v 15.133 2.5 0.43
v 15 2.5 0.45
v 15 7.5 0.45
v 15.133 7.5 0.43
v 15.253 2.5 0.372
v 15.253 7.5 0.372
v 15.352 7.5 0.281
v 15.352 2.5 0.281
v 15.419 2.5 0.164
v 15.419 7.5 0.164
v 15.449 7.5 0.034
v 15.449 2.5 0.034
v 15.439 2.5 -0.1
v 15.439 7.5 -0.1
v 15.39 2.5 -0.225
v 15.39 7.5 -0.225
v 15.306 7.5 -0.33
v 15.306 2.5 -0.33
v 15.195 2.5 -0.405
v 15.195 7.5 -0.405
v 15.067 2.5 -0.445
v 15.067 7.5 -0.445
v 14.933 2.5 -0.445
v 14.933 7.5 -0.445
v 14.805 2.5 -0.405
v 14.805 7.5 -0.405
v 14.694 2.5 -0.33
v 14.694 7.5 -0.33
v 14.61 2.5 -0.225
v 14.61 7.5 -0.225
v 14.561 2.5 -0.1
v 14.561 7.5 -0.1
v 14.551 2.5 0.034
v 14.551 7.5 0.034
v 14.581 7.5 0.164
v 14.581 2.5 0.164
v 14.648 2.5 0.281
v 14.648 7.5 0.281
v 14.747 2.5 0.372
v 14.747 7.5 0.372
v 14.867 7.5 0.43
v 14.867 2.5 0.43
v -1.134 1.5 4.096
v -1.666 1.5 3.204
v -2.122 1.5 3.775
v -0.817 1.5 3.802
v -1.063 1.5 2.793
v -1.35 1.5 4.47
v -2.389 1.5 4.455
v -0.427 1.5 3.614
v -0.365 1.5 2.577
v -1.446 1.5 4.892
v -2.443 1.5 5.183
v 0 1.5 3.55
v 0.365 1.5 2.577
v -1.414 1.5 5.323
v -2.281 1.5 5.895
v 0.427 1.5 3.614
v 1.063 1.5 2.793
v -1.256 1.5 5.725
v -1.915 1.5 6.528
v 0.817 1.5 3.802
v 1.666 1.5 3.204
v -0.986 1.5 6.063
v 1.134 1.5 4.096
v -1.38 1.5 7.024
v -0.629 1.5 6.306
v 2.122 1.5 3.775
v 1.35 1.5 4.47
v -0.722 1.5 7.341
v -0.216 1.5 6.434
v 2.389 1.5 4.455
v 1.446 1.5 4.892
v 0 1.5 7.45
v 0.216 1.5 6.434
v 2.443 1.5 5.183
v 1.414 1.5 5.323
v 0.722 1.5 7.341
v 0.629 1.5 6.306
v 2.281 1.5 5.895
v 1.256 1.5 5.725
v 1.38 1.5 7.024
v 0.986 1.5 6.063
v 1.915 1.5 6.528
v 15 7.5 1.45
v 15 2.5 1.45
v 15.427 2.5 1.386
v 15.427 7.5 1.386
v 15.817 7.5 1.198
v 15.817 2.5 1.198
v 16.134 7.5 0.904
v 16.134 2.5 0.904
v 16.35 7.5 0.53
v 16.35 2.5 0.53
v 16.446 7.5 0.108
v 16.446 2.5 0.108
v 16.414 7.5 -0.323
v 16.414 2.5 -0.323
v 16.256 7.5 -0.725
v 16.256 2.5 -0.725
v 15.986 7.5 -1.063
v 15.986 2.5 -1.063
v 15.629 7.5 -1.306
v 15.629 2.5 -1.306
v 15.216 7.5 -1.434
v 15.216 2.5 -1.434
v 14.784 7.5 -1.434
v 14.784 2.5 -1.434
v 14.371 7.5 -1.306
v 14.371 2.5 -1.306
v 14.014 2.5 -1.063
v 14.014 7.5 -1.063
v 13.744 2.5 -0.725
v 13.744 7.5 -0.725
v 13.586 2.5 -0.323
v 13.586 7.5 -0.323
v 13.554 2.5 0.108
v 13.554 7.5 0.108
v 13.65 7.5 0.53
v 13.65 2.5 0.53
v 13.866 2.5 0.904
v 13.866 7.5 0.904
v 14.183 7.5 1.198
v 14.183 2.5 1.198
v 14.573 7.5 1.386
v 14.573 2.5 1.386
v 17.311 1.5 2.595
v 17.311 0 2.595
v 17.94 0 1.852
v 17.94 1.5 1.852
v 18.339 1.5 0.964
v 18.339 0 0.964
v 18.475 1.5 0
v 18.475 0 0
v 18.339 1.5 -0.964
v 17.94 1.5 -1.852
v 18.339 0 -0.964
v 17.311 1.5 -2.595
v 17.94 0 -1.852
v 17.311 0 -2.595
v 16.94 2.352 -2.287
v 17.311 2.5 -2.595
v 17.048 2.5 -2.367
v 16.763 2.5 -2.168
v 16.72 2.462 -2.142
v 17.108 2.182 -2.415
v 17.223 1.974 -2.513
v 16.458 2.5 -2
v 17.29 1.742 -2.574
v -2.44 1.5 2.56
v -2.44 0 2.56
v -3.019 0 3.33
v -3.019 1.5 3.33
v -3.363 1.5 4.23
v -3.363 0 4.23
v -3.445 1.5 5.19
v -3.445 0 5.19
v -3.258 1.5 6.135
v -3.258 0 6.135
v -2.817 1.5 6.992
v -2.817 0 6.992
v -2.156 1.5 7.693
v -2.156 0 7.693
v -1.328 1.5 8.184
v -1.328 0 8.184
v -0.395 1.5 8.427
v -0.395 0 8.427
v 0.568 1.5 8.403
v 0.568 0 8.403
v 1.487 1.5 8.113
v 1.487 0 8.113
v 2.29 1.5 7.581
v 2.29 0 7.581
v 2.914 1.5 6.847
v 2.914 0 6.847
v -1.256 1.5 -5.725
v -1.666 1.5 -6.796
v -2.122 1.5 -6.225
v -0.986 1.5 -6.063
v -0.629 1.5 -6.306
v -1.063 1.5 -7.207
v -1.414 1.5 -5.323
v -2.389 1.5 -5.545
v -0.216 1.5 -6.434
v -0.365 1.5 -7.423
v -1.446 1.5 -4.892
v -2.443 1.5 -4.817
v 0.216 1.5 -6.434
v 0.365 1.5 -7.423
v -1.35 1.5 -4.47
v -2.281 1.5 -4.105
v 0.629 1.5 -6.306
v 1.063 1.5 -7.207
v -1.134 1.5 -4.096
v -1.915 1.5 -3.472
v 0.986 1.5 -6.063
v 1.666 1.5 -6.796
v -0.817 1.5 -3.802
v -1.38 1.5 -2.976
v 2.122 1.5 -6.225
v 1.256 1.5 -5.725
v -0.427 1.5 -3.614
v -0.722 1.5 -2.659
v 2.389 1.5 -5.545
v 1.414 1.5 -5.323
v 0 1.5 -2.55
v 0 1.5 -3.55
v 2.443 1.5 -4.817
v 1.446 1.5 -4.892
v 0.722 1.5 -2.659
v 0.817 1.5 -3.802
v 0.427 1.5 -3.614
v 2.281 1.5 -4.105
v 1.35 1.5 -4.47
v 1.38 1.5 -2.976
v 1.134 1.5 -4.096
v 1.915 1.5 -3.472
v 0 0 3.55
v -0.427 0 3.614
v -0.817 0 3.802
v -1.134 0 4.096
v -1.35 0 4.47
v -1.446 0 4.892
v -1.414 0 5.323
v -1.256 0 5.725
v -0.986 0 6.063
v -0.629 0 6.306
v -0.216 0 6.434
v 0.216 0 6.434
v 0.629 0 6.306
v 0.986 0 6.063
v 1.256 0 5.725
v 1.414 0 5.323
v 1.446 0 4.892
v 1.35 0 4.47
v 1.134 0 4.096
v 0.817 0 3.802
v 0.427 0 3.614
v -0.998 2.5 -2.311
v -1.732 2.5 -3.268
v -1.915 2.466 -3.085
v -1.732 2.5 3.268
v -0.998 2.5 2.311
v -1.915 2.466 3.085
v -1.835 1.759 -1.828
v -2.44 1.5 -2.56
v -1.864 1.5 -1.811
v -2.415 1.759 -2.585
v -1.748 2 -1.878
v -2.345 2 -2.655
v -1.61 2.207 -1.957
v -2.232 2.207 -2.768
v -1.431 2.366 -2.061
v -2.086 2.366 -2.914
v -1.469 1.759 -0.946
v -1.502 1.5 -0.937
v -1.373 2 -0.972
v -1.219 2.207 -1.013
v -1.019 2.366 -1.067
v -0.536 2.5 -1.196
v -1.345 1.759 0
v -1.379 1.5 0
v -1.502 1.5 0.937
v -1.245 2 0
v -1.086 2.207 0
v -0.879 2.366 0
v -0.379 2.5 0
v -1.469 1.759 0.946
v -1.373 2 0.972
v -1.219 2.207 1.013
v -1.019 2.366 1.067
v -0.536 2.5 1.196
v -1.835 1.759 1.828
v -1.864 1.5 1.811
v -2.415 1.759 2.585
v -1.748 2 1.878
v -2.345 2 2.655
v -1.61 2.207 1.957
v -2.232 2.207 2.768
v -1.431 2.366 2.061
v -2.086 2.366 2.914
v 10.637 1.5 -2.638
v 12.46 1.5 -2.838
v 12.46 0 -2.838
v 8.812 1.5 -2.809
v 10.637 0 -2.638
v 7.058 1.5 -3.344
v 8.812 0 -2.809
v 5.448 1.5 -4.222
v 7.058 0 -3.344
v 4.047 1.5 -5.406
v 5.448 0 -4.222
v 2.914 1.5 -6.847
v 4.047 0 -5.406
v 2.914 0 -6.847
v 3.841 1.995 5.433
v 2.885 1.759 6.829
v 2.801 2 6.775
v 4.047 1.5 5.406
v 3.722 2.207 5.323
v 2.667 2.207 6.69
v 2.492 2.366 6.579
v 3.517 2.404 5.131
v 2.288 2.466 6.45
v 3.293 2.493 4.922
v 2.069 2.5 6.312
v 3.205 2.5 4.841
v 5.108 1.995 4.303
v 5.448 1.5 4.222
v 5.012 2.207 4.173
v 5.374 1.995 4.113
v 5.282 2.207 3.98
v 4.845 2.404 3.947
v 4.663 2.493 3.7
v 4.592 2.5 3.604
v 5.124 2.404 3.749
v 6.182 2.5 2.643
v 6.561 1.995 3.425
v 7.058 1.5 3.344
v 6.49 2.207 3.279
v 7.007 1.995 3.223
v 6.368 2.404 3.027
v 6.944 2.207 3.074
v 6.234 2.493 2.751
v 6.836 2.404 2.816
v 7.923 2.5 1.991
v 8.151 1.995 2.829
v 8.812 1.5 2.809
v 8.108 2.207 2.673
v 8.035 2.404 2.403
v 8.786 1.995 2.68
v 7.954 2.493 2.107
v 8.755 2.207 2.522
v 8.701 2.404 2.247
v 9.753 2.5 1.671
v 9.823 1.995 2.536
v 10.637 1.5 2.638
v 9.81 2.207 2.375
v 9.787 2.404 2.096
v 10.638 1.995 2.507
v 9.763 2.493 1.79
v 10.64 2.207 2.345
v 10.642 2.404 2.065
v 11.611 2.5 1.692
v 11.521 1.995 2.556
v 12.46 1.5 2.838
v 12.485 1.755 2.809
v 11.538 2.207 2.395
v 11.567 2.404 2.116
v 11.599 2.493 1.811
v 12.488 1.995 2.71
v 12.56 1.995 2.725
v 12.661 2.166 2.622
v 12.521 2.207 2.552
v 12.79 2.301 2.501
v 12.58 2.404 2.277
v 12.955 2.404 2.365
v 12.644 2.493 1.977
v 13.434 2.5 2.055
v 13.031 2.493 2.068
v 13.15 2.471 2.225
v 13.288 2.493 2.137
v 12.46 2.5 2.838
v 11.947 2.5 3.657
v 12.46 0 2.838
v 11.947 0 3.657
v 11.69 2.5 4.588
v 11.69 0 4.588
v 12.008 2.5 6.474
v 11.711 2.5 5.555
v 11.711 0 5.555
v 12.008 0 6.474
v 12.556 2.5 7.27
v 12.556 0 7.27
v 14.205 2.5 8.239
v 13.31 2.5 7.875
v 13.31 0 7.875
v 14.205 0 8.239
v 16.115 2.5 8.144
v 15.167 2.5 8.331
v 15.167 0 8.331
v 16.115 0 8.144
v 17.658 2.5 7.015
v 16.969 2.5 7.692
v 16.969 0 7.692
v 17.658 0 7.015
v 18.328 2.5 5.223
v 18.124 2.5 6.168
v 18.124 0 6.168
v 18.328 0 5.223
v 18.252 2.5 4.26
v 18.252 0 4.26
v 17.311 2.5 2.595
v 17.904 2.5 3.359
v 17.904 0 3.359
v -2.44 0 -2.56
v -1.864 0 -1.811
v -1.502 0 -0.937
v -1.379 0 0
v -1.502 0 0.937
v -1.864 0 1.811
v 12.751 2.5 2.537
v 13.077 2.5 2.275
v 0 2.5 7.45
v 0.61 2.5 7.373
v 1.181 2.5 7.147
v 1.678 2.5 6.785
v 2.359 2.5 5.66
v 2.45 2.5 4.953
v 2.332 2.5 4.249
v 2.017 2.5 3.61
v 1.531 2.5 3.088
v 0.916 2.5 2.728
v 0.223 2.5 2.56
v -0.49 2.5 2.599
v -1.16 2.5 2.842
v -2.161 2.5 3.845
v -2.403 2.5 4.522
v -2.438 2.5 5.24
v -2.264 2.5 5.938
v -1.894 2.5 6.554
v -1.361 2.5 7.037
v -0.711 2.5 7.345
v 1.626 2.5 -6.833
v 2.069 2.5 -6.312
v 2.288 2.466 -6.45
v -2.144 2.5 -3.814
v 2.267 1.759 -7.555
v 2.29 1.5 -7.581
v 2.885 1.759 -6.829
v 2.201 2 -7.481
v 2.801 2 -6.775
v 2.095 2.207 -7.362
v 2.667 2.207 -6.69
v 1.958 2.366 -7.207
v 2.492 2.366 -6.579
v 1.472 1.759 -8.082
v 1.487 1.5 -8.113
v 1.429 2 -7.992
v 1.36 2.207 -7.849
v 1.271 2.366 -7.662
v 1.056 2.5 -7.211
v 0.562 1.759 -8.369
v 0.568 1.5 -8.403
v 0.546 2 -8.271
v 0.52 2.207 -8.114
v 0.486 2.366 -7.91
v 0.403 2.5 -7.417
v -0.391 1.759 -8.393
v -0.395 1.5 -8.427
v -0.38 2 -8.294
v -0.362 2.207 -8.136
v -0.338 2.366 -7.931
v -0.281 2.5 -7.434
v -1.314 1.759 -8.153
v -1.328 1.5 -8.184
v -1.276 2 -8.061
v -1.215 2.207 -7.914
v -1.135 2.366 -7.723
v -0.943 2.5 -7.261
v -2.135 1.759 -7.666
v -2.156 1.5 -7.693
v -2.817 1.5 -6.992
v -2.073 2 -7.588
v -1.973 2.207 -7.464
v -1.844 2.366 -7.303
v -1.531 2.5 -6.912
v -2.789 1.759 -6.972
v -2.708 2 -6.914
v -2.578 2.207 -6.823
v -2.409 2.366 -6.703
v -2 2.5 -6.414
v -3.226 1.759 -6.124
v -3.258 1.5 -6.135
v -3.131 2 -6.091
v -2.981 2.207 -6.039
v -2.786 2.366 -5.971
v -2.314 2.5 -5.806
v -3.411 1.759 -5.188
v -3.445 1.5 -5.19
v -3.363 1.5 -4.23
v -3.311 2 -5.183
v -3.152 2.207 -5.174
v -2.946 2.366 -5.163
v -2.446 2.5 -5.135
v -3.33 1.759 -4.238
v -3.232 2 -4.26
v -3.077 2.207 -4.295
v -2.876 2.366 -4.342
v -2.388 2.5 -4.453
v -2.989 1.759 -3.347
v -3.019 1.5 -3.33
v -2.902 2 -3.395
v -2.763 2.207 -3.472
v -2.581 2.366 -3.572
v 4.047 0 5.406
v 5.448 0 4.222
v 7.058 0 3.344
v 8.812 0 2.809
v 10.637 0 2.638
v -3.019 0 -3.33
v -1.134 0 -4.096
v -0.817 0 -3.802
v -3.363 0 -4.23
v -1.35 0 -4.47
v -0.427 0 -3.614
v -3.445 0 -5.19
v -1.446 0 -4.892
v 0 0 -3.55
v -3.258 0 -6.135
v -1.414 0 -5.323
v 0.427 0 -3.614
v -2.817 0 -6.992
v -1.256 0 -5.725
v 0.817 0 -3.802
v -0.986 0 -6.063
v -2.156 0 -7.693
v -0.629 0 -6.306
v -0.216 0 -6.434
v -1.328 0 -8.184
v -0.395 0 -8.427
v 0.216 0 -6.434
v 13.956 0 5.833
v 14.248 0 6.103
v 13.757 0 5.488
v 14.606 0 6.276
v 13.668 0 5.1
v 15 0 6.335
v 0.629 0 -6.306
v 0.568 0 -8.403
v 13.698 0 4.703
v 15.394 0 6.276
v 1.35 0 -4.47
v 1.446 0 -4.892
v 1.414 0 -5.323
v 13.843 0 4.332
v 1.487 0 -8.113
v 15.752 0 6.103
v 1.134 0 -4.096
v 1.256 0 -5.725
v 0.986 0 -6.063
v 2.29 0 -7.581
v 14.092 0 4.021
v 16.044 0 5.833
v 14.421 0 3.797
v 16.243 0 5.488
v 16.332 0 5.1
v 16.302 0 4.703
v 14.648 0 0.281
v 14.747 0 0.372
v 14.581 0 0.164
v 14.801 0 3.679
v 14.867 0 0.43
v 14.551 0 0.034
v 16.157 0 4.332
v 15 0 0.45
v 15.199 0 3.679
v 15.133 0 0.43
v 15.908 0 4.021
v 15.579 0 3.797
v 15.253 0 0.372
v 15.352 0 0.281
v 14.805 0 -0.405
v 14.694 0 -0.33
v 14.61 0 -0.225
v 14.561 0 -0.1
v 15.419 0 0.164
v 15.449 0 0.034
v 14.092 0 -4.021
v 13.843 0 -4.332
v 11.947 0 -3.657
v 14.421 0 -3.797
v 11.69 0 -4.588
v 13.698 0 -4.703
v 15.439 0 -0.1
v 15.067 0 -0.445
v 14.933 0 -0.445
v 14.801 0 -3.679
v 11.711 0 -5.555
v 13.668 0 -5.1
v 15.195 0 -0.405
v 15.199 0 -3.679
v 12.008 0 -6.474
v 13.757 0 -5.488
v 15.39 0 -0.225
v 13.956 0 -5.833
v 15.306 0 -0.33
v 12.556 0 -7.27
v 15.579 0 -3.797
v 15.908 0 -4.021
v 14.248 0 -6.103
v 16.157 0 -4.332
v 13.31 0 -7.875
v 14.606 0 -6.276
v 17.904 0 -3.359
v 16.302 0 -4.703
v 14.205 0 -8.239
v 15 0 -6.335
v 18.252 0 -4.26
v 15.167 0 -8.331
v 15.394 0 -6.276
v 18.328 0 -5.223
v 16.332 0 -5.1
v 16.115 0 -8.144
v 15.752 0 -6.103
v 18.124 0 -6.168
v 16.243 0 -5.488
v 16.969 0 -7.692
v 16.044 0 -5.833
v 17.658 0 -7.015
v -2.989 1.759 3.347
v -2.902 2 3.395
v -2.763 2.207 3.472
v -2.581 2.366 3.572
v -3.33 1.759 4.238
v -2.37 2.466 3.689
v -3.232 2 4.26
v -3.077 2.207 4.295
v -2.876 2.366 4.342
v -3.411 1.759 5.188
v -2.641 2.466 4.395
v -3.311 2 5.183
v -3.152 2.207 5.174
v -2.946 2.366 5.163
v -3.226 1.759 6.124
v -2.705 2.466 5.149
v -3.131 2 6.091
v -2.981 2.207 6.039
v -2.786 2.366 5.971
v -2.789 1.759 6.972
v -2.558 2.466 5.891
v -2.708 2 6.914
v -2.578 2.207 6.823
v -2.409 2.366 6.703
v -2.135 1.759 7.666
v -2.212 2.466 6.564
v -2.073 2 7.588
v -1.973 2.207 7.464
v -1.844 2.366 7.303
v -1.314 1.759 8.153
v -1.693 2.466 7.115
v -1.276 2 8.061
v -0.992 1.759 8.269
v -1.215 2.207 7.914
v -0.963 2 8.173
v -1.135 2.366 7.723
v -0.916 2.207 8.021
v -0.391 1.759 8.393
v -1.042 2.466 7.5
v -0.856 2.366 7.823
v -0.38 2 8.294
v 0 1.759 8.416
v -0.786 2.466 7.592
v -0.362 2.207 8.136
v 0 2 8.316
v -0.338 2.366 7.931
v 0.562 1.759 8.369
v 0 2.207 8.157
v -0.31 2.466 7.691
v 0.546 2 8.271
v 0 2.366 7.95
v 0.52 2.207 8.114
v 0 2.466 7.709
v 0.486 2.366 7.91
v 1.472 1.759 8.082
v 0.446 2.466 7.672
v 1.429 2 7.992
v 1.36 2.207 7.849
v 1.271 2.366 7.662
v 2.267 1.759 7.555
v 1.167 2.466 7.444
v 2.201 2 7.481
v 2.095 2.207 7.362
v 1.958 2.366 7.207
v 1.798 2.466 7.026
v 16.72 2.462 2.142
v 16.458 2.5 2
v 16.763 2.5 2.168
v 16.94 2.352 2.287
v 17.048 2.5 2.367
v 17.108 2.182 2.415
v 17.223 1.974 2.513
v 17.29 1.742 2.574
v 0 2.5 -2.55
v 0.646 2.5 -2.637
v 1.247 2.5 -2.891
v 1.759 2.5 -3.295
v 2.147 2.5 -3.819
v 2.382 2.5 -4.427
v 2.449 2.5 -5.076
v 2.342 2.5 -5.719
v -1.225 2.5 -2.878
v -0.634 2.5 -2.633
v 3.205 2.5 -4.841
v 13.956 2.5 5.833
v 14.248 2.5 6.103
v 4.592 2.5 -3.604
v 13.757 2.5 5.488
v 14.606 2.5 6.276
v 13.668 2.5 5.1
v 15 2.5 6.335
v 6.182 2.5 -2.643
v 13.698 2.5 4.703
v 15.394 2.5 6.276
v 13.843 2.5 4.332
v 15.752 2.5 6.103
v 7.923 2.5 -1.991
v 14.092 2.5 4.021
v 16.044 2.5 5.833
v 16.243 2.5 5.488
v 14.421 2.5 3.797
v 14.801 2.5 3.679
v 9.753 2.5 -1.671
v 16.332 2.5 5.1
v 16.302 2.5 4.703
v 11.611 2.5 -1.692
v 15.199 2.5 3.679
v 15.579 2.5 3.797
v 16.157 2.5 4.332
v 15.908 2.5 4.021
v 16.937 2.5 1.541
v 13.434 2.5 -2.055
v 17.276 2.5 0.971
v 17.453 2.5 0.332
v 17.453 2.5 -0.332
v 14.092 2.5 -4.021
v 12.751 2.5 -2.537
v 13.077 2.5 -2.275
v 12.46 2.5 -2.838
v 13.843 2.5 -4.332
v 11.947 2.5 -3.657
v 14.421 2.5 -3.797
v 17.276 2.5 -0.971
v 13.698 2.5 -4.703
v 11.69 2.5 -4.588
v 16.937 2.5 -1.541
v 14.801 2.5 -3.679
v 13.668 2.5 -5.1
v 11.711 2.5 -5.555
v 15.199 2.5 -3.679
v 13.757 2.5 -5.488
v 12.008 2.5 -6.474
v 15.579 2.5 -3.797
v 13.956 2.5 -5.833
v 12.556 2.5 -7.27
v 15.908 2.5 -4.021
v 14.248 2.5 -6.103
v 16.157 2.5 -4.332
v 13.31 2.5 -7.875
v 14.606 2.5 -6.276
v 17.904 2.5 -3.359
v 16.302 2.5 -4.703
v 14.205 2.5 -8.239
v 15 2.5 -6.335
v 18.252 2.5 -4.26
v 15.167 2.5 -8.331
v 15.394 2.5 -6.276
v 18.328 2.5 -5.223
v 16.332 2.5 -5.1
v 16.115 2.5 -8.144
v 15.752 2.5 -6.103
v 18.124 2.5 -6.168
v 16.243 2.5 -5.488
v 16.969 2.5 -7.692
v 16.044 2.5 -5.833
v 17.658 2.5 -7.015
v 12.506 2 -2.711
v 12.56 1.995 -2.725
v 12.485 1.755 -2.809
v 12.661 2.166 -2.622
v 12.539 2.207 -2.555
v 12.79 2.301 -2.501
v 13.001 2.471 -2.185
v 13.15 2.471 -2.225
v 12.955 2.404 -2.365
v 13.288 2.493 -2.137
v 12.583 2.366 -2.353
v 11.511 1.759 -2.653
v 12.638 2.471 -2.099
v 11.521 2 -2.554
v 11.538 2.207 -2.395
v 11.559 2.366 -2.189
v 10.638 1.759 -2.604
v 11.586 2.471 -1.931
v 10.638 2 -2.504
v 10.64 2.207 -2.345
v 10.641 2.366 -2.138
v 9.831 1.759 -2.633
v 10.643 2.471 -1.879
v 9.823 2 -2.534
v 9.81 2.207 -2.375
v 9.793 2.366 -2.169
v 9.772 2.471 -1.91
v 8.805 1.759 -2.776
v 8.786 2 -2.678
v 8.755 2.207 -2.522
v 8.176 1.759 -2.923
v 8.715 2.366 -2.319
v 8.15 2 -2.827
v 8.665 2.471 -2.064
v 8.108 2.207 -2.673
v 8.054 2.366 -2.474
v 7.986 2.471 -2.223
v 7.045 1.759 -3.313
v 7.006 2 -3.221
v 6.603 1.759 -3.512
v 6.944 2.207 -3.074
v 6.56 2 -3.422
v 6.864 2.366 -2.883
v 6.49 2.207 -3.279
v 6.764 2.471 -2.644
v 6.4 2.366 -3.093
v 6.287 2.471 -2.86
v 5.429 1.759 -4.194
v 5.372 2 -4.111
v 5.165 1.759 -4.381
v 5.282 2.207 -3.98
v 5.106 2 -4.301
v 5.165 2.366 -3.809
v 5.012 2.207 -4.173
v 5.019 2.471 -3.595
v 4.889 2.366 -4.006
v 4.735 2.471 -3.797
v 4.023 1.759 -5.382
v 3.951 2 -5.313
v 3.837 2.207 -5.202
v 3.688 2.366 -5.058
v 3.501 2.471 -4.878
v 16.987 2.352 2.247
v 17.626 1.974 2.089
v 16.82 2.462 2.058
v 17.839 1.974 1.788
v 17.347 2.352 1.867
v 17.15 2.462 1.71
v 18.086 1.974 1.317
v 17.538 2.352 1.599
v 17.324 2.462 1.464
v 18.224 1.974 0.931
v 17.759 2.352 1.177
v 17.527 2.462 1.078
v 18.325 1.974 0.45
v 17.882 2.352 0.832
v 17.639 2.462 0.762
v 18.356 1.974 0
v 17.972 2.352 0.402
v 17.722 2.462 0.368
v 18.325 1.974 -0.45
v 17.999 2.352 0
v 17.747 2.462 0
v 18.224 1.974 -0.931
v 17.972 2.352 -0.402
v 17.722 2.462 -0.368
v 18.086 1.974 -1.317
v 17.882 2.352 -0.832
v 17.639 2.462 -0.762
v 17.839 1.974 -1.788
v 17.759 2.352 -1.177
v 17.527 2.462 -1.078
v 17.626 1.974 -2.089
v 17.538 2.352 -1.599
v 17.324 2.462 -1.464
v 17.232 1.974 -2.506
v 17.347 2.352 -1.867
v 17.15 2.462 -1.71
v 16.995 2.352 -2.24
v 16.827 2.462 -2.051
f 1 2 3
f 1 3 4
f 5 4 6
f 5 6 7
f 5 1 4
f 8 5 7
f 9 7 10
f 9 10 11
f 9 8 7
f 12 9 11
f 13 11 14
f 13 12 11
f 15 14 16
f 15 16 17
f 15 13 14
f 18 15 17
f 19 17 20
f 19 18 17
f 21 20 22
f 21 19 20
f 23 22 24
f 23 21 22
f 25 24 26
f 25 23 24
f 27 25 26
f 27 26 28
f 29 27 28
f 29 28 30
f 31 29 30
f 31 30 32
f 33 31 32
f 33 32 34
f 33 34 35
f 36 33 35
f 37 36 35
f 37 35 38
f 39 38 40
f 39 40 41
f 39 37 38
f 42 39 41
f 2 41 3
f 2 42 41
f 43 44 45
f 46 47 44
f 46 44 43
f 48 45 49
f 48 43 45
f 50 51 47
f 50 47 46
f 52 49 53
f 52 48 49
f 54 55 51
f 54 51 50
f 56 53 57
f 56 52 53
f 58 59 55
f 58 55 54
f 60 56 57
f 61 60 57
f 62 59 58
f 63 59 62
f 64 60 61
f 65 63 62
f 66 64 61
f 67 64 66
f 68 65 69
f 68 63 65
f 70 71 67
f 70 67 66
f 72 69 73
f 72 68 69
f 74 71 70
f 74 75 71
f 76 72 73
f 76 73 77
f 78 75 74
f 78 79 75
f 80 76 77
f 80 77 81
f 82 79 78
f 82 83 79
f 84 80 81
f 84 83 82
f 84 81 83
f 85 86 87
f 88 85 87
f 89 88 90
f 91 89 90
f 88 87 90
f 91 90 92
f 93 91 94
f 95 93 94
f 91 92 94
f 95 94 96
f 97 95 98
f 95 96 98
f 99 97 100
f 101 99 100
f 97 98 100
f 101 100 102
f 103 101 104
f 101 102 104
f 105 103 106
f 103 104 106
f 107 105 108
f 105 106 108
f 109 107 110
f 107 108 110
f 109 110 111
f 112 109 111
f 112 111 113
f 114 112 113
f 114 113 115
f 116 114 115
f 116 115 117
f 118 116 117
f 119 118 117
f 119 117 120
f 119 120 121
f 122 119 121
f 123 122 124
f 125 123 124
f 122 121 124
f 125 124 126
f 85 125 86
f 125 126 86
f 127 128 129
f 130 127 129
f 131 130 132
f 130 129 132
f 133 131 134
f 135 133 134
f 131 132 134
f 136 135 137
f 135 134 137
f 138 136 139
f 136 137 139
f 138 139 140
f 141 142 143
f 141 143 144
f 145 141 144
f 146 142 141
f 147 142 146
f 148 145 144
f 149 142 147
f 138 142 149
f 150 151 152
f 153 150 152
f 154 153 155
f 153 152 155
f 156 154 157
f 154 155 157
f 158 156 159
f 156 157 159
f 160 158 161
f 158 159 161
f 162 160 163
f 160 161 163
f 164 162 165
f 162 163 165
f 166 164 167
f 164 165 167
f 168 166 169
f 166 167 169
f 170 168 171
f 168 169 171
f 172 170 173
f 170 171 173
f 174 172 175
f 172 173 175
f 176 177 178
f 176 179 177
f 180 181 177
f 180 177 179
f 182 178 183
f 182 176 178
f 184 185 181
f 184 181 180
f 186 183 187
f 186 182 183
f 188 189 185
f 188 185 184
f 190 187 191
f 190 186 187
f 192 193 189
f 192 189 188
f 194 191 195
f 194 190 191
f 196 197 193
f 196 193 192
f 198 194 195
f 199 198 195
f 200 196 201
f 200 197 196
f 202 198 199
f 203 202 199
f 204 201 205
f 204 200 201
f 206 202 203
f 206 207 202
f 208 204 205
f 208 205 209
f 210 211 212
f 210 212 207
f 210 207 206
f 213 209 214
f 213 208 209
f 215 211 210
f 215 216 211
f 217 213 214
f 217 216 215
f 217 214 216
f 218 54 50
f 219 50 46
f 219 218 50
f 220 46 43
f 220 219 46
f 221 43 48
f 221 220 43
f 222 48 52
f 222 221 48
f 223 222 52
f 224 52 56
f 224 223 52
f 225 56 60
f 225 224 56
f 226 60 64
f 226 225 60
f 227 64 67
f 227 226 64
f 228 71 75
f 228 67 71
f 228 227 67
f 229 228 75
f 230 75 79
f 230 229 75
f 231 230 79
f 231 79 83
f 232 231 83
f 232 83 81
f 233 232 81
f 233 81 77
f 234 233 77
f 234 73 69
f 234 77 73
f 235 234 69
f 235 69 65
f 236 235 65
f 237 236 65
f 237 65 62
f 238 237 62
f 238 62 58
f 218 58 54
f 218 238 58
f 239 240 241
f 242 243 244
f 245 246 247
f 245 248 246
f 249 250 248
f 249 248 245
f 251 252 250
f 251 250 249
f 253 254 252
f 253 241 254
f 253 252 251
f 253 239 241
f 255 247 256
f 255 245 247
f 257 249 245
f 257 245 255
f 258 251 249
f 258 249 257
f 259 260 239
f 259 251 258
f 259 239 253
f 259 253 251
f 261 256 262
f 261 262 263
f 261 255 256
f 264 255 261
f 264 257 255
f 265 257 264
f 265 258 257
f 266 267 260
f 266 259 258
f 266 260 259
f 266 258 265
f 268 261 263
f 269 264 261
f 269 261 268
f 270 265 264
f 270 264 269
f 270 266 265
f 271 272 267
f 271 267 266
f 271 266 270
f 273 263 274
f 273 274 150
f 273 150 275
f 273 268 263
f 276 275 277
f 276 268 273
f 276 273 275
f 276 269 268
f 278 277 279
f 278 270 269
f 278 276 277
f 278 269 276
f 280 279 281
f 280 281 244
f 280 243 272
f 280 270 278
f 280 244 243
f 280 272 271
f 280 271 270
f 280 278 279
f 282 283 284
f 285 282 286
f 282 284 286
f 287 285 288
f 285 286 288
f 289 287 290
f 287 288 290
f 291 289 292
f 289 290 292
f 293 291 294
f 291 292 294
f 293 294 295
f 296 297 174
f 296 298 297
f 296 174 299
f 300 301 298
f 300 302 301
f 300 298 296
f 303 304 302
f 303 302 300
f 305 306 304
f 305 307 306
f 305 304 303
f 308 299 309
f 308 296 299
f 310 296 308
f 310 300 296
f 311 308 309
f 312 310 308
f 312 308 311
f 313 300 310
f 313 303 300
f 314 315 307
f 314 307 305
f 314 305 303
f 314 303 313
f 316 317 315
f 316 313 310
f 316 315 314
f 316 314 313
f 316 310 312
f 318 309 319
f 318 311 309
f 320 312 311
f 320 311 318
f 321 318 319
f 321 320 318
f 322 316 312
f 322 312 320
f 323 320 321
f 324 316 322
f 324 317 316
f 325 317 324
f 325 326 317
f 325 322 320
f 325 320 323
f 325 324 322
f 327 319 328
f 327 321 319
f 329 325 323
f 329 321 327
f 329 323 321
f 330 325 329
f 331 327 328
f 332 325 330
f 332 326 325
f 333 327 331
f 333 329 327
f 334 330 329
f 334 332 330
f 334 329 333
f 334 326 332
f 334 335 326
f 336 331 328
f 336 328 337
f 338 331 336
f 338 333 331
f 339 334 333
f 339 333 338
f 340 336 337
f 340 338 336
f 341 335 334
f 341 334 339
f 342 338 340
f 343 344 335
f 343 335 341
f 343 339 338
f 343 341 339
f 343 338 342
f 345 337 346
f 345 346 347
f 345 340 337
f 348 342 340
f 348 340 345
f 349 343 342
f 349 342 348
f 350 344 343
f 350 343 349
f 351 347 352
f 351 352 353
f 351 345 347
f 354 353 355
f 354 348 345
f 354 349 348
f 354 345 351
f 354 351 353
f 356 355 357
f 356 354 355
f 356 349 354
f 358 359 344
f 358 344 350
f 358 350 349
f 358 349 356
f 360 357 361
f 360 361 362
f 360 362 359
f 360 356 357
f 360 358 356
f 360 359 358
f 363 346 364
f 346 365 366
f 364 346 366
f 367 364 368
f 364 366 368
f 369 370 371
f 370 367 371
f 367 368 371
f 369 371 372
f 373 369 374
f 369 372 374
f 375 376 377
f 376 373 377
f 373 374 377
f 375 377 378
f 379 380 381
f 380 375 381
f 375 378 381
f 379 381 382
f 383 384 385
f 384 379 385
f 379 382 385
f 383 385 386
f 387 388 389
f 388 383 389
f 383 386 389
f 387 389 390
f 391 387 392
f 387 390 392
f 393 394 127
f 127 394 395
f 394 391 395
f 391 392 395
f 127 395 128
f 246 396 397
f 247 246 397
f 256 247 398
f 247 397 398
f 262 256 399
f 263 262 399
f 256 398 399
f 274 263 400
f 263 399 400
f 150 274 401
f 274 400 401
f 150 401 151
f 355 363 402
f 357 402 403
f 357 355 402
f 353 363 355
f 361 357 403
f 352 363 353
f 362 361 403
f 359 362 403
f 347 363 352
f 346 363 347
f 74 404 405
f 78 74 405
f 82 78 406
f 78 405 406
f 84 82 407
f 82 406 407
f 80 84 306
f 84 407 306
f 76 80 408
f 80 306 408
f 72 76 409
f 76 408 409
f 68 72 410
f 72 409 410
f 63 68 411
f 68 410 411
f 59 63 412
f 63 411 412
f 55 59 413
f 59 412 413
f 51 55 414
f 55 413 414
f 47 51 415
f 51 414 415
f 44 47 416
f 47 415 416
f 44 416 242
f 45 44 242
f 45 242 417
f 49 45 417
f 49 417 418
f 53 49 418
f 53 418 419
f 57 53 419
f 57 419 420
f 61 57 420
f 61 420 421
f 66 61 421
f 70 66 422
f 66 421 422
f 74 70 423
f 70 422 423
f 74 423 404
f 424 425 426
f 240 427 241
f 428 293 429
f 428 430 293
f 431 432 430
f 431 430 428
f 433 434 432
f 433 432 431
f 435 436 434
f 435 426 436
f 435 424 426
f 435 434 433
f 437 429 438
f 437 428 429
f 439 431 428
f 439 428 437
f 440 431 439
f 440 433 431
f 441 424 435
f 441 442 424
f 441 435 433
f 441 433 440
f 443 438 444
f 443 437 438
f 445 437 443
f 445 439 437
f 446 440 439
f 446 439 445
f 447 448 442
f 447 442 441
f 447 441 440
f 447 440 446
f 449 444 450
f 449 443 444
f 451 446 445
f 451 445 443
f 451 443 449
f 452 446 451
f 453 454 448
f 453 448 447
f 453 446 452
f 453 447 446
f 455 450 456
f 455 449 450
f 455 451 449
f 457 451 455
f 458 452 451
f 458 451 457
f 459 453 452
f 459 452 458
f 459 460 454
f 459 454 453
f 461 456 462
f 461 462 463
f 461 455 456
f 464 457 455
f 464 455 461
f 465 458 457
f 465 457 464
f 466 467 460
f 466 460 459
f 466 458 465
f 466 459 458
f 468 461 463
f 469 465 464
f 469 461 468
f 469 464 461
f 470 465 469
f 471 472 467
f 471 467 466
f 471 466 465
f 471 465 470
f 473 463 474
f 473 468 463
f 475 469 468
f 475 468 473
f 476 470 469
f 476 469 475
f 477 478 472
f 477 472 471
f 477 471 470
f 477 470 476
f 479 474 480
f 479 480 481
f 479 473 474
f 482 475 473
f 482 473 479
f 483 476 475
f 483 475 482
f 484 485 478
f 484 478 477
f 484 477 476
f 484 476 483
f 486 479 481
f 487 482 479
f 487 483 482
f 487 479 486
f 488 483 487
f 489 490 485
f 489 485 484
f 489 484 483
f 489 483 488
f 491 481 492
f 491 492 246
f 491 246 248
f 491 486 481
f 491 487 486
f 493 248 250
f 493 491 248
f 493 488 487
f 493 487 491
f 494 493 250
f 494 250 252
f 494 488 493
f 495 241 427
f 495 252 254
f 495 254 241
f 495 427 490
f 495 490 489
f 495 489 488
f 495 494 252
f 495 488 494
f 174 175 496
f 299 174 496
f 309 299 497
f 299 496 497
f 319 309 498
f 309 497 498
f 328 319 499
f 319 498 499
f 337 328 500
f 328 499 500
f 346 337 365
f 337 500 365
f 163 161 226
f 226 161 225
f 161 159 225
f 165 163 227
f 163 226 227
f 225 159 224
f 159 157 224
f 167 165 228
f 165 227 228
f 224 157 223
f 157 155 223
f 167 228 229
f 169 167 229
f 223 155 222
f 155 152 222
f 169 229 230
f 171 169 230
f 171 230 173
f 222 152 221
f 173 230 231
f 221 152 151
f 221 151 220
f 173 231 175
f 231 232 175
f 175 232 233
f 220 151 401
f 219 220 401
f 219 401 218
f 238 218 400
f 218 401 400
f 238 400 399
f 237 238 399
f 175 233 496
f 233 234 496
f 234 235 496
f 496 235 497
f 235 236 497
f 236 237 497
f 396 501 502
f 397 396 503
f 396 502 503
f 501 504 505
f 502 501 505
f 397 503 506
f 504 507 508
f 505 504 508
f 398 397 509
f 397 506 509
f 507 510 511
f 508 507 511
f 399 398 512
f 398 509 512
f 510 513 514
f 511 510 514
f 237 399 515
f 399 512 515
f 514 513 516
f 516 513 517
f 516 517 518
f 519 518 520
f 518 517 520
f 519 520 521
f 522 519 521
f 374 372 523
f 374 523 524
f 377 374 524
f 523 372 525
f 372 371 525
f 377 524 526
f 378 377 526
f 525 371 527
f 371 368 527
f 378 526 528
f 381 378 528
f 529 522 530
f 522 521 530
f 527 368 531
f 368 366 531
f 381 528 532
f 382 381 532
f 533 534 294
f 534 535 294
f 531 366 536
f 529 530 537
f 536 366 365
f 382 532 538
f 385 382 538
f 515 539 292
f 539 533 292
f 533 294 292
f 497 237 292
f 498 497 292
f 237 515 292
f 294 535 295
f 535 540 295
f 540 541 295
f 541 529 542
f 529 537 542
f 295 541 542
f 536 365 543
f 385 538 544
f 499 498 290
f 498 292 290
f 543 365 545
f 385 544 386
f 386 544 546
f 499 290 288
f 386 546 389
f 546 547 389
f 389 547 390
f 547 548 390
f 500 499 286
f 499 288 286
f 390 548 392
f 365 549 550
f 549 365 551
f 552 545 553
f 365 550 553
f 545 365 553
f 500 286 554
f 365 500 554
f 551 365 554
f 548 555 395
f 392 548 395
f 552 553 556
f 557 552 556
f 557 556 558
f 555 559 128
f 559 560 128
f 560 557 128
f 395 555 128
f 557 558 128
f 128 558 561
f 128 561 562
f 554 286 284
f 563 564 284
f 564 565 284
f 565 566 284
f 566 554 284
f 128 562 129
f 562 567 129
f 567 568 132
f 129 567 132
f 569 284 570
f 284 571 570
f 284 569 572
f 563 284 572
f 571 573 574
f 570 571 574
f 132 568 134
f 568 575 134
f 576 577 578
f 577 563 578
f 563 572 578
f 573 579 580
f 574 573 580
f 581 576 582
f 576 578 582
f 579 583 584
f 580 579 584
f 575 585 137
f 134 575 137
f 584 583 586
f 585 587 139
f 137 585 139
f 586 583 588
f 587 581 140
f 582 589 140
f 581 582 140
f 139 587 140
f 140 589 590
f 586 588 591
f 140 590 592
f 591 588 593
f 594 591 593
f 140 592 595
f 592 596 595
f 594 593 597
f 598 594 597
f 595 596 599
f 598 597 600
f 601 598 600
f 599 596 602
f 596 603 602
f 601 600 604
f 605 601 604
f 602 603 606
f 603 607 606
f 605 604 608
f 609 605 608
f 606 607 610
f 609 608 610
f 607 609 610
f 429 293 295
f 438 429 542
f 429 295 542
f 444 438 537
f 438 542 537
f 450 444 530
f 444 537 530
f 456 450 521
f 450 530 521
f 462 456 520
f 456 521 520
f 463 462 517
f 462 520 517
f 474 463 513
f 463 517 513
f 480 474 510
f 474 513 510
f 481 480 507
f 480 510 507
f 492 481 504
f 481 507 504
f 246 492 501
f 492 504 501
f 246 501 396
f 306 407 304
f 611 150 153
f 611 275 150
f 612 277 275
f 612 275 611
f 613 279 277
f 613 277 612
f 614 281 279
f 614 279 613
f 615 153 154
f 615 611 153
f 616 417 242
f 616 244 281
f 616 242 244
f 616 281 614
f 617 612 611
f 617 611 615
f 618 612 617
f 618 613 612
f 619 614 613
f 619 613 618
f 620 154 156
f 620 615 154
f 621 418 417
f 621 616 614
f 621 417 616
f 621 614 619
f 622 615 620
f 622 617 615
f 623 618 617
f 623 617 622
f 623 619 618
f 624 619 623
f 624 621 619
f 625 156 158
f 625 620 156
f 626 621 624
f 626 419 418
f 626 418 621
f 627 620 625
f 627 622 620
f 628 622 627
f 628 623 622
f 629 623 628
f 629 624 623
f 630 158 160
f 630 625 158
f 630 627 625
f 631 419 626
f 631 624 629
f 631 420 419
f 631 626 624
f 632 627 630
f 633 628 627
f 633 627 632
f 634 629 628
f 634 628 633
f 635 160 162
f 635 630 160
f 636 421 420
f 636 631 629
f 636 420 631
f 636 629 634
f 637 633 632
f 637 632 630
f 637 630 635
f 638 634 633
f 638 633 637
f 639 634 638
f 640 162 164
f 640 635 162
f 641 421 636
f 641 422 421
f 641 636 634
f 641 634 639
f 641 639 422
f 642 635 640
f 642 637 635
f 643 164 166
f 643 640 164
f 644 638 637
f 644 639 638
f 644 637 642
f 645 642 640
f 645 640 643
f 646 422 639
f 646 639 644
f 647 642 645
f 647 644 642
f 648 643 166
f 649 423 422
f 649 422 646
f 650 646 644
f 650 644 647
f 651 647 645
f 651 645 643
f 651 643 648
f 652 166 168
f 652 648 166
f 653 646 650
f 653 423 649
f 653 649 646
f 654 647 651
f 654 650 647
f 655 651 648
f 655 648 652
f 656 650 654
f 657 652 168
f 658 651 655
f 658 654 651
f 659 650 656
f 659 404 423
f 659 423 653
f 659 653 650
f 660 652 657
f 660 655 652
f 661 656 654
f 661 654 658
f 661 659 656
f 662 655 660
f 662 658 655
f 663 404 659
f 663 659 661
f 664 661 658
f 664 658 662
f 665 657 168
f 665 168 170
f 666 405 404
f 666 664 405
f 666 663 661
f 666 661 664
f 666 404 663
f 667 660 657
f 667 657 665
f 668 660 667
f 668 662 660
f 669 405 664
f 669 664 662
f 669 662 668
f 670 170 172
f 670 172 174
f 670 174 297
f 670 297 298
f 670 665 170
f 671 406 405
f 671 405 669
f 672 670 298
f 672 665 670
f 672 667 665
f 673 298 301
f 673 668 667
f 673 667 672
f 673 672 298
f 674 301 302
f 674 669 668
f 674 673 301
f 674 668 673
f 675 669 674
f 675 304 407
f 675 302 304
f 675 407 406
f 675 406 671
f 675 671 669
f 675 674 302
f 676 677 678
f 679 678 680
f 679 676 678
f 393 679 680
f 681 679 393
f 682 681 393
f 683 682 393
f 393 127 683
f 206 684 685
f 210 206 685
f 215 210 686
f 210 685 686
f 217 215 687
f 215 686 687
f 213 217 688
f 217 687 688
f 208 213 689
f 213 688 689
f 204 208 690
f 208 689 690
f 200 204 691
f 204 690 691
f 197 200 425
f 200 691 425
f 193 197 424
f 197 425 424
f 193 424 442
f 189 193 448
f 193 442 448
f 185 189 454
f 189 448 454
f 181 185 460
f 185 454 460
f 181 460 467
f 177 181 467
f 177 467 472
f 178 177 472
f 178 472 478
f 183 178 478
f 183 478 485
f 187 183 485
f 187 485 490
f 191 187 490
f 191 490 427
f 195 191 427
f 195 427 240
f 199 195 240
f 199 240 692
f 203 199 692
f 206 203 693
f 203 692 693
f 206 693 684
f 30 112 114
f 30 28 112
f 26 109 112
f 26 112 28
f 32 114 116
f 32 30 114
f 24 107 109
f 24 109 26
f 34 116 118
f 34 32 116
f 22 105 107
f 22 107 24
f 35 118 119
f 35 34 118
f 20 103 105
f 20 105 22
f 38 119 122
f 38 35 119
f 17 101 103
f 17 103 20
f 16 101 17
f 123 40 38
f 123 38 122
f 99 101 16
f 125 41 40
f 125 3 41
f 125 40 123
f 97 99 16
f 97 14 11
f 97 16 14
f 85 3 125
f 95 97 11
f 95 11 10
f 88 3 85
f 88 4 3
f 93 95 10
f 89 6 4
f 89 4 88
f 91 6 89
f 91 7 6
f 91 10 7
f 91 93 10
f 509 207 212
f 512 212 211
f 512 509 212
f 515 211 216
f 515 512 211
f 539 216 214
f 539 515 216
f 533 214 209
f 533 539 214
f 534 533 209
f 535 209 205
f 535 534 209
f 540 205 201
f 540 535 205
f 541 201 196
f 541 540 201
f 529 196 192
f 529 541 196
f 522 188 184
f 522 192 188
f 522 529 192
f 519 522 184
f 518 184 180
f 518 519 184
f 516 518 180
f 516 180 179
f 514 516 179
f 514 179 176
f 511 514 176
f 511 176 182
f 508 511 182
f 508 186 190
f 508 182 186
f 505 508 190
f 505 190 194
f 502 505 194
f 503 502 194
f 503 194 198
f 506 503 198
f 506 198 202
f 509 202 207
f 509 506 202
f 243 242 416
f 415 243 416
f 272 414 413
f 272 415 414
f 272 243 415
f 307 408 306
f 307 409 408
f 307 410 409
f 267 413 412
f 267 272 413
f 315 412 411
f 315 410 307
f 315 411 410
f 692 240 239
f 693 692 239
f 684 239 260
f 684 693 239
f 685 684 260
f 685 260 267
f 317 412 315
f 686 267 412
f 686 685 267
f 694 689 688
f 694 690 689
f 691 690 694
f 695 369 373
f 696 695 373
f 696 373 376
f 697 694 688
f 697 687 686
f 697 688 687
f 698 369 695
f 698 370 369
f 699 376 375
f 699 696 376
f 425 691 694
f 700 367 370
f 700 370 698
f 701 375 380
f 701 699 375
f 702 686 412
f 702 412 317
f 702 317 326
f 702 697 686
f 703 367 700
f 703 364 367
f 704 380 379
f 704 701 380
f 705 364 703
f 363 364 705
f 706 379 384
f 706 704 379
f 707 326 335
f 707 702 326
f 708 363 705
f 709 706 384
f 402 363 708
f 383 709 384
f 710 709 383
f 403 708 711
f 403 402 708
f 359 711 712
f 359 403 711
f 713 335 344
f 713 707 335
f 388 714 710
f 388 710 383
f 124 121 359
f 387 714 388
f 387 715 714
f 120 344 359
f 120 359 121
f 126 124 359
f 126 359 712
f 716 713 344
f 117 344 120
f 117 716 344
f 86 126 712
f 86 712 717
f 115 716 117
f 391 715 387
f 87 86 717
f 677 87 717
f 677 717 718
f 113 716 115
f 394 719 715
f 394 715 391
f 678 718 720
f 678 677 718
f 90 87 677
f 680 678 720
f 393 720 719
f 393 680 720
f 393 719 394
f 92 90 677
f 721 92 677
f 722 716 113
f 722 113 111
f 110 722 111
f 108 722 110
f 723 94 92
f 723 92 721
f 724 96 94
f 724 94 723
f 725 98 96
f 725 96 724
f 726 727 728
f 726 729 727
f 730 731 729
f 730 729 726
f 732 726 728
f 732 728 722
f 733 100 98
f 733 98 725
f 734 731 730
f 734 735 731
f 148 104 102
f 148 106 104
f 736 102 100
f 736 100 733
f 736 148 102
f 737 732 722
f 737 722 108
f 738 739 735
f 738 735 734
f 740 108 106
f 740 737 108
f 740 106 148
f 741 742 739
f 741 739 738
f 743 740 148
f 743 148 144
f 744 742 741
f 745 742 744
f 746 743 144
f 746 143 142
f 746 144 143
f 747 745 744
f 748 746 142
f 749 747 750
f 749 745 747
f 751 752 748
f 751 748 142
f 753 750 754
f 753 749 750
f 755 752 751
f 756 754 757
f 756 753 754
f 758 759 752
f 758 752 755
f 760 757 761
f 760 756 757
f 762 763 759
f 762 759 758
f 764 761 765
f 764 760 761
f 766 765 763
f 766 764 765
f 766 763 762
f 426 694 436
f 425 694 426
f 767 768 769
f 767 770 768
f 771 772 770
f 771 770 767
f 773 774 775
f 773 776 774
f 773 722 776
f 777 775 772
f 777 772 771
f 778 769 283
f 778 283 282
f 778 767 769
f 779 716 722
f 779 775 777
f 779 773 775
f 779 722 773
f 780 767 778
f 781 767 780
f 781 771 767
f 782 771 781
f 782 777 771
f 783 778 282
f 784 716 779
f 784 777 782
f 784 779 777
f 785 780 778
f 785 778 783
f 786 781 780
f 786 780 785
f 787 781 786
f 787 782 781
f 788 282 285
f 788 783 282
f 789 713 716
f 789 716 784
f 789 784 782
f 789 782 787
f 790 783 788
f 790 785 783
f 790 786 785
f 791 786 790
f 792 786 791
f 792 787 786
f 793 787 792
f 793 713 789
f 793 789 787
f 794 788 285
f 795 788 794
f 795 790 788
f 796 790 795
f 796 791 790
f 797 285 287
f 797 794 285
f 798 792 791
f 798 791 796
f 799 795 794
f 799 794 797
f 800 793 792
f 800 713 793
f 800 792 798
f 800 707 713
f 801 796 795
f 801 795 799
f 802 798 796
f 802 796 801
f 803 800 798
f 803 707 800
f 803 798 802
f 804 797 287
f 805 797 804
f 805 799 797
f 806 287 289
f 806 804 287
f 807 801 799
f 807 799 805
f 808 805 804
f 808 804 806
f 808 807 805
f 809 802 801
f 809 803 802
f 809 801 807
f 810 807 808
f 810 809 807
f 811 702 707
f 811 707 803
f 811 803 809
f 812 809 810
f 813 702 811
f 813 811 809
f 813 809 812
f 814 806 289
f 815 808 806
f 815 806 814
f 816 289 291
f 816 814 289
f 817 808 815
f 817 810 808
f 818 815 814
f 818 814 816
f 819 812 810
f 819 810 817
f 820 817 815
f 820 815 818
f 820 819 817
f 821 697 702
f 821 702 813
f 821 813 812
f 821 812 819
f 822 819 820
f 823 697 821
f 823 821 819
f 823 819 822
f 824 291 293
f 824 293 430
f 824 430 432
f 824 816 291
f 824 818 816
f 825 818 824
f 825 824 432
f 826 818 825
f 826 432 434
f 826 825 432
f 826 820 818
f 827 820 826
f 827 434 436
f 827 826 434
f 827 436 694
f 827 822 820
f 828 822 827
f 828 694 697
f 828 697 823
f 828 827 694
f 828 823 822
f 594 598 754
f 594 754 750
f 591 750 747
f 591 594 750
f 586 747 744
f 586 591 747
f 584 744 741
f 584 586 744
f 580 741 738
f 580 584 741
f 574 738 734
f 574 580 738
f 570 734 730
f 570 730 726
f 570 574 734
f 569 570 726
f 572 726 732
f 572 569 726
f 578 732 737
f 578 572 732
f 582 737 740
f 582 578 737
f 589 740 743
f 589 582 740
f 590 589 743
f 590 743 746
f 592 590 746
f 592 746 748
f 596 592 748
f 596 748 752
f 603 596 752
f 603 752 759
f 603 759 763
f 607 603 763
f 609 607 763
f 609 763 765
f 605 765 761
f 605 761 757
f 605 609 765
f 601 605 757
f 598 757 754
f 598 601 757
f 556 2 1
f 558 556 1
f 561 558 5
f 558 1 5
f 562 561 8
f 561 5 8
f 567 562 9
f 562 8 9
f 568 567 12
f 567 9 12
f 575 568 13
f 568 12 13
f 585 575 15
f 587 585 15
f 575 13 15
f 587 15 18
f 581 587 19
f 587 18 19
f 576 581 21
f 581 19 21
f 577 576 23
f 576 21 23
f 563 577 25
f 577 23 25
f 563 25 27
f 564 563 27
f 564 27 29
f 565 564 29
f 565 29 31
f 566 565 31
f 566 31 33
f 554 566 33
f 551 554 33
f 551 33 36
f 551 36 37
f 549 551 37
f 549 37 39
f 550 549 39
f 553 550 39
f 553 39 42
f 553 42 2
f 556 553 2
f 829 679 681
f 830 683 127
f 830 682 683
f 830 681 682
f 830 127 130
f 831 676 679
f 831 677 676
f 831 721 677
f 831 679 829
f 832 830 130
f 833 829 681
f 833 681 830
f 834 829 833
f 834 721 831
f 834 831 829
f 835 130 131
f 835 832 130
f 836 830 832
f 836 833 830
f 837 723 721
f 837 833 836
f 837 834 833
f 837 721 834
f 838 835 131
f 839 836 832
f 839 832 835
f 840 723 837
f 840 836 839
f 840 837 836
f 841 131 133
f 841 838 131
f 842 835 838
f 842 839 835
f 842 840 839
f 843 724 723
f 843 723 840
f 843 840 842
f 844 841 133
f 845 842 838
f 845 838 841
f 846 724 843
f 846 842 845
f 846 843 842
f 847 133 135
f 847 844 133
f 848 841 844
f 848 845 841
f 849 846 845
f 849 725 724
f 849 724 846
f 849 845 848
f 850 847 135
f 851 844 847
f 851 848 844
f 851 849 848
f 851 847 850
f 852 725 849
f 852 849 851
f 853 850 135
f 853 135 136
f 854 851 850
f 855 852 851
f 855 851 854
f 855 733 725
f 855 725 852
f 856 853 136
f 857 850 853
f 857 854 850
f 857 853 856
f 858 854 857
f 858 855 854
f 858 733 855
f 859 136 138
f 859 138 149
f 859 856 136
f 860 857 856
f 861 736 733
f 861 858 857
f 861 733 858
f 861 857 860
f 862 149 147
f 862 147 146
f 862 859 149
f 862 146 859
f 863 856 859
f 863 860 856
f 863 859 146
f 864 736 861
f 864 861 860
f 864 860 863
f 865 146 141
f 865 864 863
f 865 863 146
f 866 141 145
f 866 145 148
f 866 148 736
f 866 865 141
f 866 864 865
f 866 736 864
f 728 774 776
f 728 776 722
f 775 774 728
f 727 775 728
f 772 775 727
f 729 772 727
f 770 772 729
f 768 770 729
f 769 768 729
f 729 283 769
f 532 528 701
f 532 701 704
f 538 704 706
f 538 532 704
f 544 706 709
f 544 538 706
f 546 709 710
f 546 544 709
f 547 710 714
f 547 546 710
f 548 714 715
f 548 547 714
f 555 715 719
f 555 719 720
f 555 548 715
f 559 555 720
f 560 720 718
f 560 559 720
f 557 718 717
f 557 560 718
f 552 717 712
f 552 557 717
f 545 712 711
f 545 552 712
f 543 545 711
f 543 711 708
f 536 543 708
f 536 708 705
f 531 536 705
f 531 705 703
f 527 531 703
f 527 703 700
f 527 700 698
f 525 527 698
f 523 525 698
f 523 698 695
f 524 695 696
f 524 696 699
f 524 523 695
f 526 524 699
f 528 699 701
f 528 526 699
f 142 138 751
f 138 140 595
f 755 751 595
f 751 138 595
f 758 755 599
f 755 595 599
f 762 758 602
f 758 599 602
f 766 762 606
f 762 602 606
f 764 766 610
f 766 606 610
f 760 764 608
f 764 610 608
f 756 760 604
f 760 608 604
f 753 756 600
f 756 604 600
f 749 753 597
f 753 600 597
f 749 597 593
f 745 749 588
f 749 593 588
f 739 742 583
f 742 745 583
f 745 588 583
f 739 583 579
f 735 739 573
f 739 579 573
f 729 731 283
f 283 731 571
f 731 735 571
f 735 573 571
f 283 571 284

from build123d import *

# Parameters (mm, degrees)
CROQUIS2_R              = 1.45
CROQUIS2_R_2            = 1.335493539
SALIENTE_EXTRUIR1_DEPTH = 2.5
CROQUIS3_R              = 2.45
CORTAR_EXTRUIR1_DEPTH   = 1
CROQUIS4_R              = 1.45
CROQUIS4_R_2            = 0.45
SALIENTE_EXTRUIR2_DEPTH = 5
CROQUIS5_R              = 0.45
CORTAR_EXTRUIR2_DEPTH   = 21.921953183
REDONDEO1_R             = 1


with BuildPart() as part:
    # Croquis2 → Saliente-Extruir1 (new body)
    with BuildSketch(Plane(origin=(0, 0, 0), x_dir=(1, 0, 0), z_dir=(0, 1, 0))):
        with BuildLine():
            ThreePointArc((17.31117806, -2.595010785), (18.475, 0), (17.31117806, 2.595010785))
            ThreePointArc((17.31117806, 2.595010785), (15.166848951, 8.331317844), (12.46008331, 2.837977715))
            ThreePointArc((12.46008331, 2.837977715), (7.057861128, 3.344392229), (2.913938348, 6.8470147))
            ThreePointArc((2.913938348, 6.8470147), (-2.156353419, 7.693072582), (-2.439518395, 2.560481605))
            ThreePointArc((-2.439518395, 2.560481605), (-1.378932188, 0), (-2.439518395, -2.560481605))
            ThreePointArc((-2.439518395, -2.560481605), (-2.156353419, -7.693072582), (2.913938348, -6.8470147))
            ThreePointArc((2.913938348, -6.8470147), (7.057861128, -3.344392229), (12.46008331, -2.837977715))
            ThreePointArc((12.46008331, -2.837977715), (15.166848951, -8.331317844), (17.31117806, -2.595010785))
        make_face()
        with Locations(Location((0, 5, 0), (0, 0, 270))):
            Circle(CROQUIS2_R, mode=Mode.SUBTRACT)
        with Locations(Location((0, -5, 0), (0, 0, 90))):
            Circle(CROQUIS2_R, mode=Mode.SUBTRACT)
        with Locations(Location((15, -5, 0), (0, 0, 270))):
            Circle(CROQUIS2_R_2, mode=Mode.SUBTRACT)
        with Locations(Location((15, 5, 0), (0, 0, 90))):
            Circle(CROQUIS2_R_2, mode=Mode.SUBTRACT)
    extrude(amount=SALIENTE_EXTRUIR1_DEPTH)

    # Croquis3 → Cortar-Extruir1 (cut)
    with BuildSketch(Plane(origin=(0, 2.5, 0), x_dir=(1, 0, 0), z_dir=(0, 1, 0))):
        with Locations(Location((0, 5, 0), (0, 0, 270))):
            Circle(CROQUIS3_R)
        with Locations(Location((0, -5, 0), (0, 0, 270))):
            Circle(CROQUIS3_R)
    extrude(amount=-CORTAR_EXTRUIR1_DEPTH, mode=Mode.SUBTRACT)

    # Croquis4 → Saliente-Extruir2 (add)
    with BuildSketch(Plane(origin=(0, 2.5, 0), x_dir=(1, 0, 0), z_dir=(0, 1, 0))):
        with Locations(Location((15, 0, 0), (0, 0, 270))):
            Circle(CROQUIS4_R)
        with Locations(Location((15, 0, 0), (0, 0, 270))):
            Circle(CROQUIS4_R_2, mode=Mode.SUBTRACT)
    extrude(amount=SALIENTE_EXTRUIR2_DEPTH)

    # Croquis5 → Cortar-Extruir2 (cut, through all)
    with BuildSketch(Plane(origin=(0, 2.5, 0), x_dir=(1, 0, 0), z_dir=(0, 1, 0))):
        with Locations(Location((15, 0, 0), (0, 0, 270))):
            Circle(CROQUIS5_R)
    extrude(amount=-CORTAR_EXTRUIR2_DEPTH, mode=Mode.SUBTRACT)

    # Redondeo1
    # the kernel refuses this fillet: 1 mm, written as the material it takes off along each edge
    with BuildSketch(Plane(origin=(10.565709674, 2.5, 11.697129023), x_dir=(-0.8446198111127597, 0, -0.5353665797151015), z_dir=(-0.5353665797151015, 0, 0.8446198111127597))) as redondeo1_piece_1_section:
        with BuildLine():
            CenterArc((9.059426769 + REDONDEO1_R, REDONDEO1_R), REDONDEO1_R, 180, 90)
            Line((9.059426769, REDONDEO1_R), (9.059426769 - REDONDEO1_R * 0.02, REDONDEO1_R))
            Line((9.059426769 - REDONDEO1_R * 0.02, REDONDEO1_R), (9.059426769 - REDONDEO1_R * 0.02, -REDONDEO1_R * 0.02))
            Line((9.059426769 - REDONDEO1_R * 0.02, -REDONDEO1_R * 0.02), (9.059426769 + REDONDEO1_R, -REDONDEO1_R * 0.02))
            Line((9.059426769 + REDONDEO1_R, -REDONDEO1_R * 0.02), (9.059426769 + REDONDEO1_R, 0))
        make_face()
    redondeo1_piece_1 = revolve(axis=Axis((10.565709674, 2.5, 11.697129023), (0, -1, 0)), revolution_arc=85.516050129, mode=Mode.PRIVATE)
    redondeo1_piece_1 = redondeo1_piece_1 - Plane(origin=(15, 2.217210624, 5), x_dir=(-0.7614815197926343, 0, -0.6481866205147249), z_dir=(0, -1, 0)) * Cylinder(3.335493539, 41, mode=Mode.PRIVATE)
    add(redondeo1_piece_1, mode=Mode.SUBTRACT)
    with BuildSketch(Plane(origin=(15, 2.5, 0), x_dir=(0.007852951460832107, 0, 0.9999691651012815), z_dir=(-0.9999691651012815, 0, 0.007852951460832107))) as redondeo1_piece_2_section:
        with BuildLine():
            CenterArc((3.475 - REDONDEO1_R, -REDONDEO1_R), REDONDEO1_R, 0, 90)
            Line((3.475, -REDONDEO1_R), (3.475 + REDONDEO1_R * 0.02, -REDONDEO1_R))
            Line((3.475 + REDONDEO1_R * 0.02, -REDONDEO1_R), (3.475 + REDONDEO1_R * 0.02, REDONDEO1_R * 0.02))
            Line((3.475 + REDONDEO1_R * 0.02, REDONDEO1_R * 0.02), (3.475 - REDONDEO1_R, REDONDEO1_R * 0.02))
            Line((3.475 - REDONDEO1_R, REDONDEO1_R * 0.02), (3.475 - REDONDEO1_R, 0))
        make_face()
    redondeo1_piece_2 = revolve(axis=Axis((15, 2.5, 0), (0, 1, 0)), revolution_arc=179.1001088, mode=Mode.PRIVATE)
    redondeo1_piece_2 = redondeo1_piece_2 - Plane(origin=(15, 2.215042964, -5), x_dir=(0.6929043732212018, 0, 0.7210294928579091), z_dir=(0, -1, 0)) * Cylinder(3.335493539, 14, mode=Mode.PRIVATE)
    redondeo1_piece_2 = redondeo1_piece_2 - Plane(origin=(15, 2.215042964, 5), x_dir=(-0.7614815197926343, 0, -0.6481866205147249), z_dir=(0, -1, 0)) * Cylinder(3.335493539, 14, mode=Mode.PRIVATE)
    add(redondeo1_piece_2, mode=Mode.SUBTRACT)
    with BuildSketch(Plane(origin=(10.565709674, 2.5, -11.697129023), x_dir=(0.4676957368071937, 0, 0.883889528036381), z_dir=(0.883889528036381, 0, -0.4676957368071937))) as redondeo1_piece_3_section:
        with BuildLine():
            CenterArc((9.059426769 + REDONDEO1_R, REDONDEO1_R), REDONDEO1_R, 180, 90)
            Line((9.059426769 + REDONDEO1_R, 0), (9.059426769 + REDONDEO1_R, -REDONDEO1_R * 0.02))
            Line((9.059426769 + REDONDEO1_R, -REDONDEO1_R * 0.02), (9.059426769 - REDONDEO1_R * 0.02, -REDONDEO1_R * 0.02))
            Line((9.059426769 - REDONDEO1_R * 0.02, -REDONDEO1_R * 0.02), (9.059426769 - REDONDEO1_R * 0.02, REDONDEO1_R))
            Line((9.059426769 - REDONDEO1_R * 0.02, REDONDEO1_R), (9.059426769, REDONDEO1_R))
        make_face()
    redondeo1_piece_3 = revolve(axis=Axis((10.565709674, 2.5, -11.697129023), (0, -1, 0)), revolution_arc=85.516050129, mode=Mode.PRIVATE)
    redondeo1_piece_3 = redondeo1_piece_3 - Plane(origin=(15, 2.217210619, -5), x_dir=(0.6929043732212018, 0, 0.7210294928579091), z_dir=(0, -1, 0)) * Cylinder(3.335493539, 41, mode=Mode.PRIVATE)
    add(redondeo1_piece_3, mode=Mode.SUBTRACT)
    with BuildSketch(Plane(origin=(0, 2.5, -5), x_dir=(0.8446198111127605, 0, -0.5353665797151004), z_dir=(0.5353665797151004, 0, 0.8446198111127605))) as redondeo1_piece_4:
        with BuildLine():
            CenterArc((3.45 - REDONDEO1_R, -REDONDEO1_R), REDONDEO1_R, 0, 90)
            Line((3.45 - REDONDEO1_R, 0), (3.45 - REDONDEO1_R, REDONDEO1_R * 0.02))
            Line((3.45 - REDONDEO1_R, REDONDEO1_R * 0.02), (3.45 + REDONDEO1_R * 0.02, REDONDEO1_R * 0.02))
            Line((3.45 + REDONDEO1_R * 0.02, REDONDEO1_R * 0.02), (3.45 + REDONDEO1_R * 0.02, -REDONDEO1_R))
            Line((3.45 + REDONDEO1_R * 0.02, -REDONDEO1_R), (3.45, -REDONDEO1_R))
        make_face()
    revolve(axis=Axis((0, 2.5, -5), (0, 1, 0)), revolution_arc=192.631224639, mode=Mode.SUBTRACT)
    with BuildSketch(Plane(origin=(-5, 2.5, 0), x_dir=(0.7071067811865475, 0, -0.7071067811865476), z_dir=(-0.7071067811865476, 0, -0.7071067811865475))) as redondeo1_piece_5:
        with BuildLine():
            CenterArc((3.621067812 + REDONDEO1_R, REDONDEO1_R), REDONDEO1_R, 180, 90)
            Line((3.621067812 + REDONDEO1_R, 0), (3.621067812 + REDONDEO1_R, -REDONDEO1_R * 0.02))
            Line((3.621067812 + REDONDEO1_R, -REDONDEO1_R * 0.02), (3.621067812 - REDONDEO1_R * 0.02, -REDONDEO1_R * 0.02))
            Line((3.621067812 - REDONDEO1_R * 0.02, -REDONDEO1_R * 0.02), (3.621067812 - REDONDEO1_R * 0.02, REDONDEO1_R))
            Line((3.621067812 - REDONDEO1_R * 0.02, REDONDEO1_R), (3.621067812, REDONDEO1_R))
        make_face()
    revolve(axis=Axis((-5, 2.5, 0), (0, -1, 0)), revolution_arc=90, mode=Mode.SUBTRACT)
    with BuildSketch(Plane(origin=(0, 2.5, 5), x_dir=(-0.7071067811865475, 0, -0.7071067811865476), z_dir=(0.7071067811865476, 0, -0.7071067811865475))) as redondeo1_piece_6:
        with BuildLine():
            CenterArc((3.45 - REDONDEO1_R, -REDONDEO1_R), REDONDEO1_R, 0, 90)
            Line((3.45, -REDONDEO1_R), (3.45 + REDONDEO1_R * 0.02, -REDONDEO1_R))
            Line((3.45 + REDONDEO1_R * 0.02, -REDONDEO1_R), (3.45 + REDONDEO1_R * 0.02, REDONDEO1_R * 0.02))
            Line((3.45 + REDONDEO1_R * 0.02, REDONDEO1_R * 0.02), (3.45 - REDONDEO1_R, REDONDEO1_R * 0.02))
            Line((3.45 - REDONDEO1_R, REDONDEO1_R * 0.02), (3.45 - REDONDEO1_R, 0))
        make_face()
    revolve(axis=Axis((0, 2.5, 5), (0, 1, 0)), revolution_arc=192.631224639, mode=Mode.SUBTRACT)


solid = part.part
